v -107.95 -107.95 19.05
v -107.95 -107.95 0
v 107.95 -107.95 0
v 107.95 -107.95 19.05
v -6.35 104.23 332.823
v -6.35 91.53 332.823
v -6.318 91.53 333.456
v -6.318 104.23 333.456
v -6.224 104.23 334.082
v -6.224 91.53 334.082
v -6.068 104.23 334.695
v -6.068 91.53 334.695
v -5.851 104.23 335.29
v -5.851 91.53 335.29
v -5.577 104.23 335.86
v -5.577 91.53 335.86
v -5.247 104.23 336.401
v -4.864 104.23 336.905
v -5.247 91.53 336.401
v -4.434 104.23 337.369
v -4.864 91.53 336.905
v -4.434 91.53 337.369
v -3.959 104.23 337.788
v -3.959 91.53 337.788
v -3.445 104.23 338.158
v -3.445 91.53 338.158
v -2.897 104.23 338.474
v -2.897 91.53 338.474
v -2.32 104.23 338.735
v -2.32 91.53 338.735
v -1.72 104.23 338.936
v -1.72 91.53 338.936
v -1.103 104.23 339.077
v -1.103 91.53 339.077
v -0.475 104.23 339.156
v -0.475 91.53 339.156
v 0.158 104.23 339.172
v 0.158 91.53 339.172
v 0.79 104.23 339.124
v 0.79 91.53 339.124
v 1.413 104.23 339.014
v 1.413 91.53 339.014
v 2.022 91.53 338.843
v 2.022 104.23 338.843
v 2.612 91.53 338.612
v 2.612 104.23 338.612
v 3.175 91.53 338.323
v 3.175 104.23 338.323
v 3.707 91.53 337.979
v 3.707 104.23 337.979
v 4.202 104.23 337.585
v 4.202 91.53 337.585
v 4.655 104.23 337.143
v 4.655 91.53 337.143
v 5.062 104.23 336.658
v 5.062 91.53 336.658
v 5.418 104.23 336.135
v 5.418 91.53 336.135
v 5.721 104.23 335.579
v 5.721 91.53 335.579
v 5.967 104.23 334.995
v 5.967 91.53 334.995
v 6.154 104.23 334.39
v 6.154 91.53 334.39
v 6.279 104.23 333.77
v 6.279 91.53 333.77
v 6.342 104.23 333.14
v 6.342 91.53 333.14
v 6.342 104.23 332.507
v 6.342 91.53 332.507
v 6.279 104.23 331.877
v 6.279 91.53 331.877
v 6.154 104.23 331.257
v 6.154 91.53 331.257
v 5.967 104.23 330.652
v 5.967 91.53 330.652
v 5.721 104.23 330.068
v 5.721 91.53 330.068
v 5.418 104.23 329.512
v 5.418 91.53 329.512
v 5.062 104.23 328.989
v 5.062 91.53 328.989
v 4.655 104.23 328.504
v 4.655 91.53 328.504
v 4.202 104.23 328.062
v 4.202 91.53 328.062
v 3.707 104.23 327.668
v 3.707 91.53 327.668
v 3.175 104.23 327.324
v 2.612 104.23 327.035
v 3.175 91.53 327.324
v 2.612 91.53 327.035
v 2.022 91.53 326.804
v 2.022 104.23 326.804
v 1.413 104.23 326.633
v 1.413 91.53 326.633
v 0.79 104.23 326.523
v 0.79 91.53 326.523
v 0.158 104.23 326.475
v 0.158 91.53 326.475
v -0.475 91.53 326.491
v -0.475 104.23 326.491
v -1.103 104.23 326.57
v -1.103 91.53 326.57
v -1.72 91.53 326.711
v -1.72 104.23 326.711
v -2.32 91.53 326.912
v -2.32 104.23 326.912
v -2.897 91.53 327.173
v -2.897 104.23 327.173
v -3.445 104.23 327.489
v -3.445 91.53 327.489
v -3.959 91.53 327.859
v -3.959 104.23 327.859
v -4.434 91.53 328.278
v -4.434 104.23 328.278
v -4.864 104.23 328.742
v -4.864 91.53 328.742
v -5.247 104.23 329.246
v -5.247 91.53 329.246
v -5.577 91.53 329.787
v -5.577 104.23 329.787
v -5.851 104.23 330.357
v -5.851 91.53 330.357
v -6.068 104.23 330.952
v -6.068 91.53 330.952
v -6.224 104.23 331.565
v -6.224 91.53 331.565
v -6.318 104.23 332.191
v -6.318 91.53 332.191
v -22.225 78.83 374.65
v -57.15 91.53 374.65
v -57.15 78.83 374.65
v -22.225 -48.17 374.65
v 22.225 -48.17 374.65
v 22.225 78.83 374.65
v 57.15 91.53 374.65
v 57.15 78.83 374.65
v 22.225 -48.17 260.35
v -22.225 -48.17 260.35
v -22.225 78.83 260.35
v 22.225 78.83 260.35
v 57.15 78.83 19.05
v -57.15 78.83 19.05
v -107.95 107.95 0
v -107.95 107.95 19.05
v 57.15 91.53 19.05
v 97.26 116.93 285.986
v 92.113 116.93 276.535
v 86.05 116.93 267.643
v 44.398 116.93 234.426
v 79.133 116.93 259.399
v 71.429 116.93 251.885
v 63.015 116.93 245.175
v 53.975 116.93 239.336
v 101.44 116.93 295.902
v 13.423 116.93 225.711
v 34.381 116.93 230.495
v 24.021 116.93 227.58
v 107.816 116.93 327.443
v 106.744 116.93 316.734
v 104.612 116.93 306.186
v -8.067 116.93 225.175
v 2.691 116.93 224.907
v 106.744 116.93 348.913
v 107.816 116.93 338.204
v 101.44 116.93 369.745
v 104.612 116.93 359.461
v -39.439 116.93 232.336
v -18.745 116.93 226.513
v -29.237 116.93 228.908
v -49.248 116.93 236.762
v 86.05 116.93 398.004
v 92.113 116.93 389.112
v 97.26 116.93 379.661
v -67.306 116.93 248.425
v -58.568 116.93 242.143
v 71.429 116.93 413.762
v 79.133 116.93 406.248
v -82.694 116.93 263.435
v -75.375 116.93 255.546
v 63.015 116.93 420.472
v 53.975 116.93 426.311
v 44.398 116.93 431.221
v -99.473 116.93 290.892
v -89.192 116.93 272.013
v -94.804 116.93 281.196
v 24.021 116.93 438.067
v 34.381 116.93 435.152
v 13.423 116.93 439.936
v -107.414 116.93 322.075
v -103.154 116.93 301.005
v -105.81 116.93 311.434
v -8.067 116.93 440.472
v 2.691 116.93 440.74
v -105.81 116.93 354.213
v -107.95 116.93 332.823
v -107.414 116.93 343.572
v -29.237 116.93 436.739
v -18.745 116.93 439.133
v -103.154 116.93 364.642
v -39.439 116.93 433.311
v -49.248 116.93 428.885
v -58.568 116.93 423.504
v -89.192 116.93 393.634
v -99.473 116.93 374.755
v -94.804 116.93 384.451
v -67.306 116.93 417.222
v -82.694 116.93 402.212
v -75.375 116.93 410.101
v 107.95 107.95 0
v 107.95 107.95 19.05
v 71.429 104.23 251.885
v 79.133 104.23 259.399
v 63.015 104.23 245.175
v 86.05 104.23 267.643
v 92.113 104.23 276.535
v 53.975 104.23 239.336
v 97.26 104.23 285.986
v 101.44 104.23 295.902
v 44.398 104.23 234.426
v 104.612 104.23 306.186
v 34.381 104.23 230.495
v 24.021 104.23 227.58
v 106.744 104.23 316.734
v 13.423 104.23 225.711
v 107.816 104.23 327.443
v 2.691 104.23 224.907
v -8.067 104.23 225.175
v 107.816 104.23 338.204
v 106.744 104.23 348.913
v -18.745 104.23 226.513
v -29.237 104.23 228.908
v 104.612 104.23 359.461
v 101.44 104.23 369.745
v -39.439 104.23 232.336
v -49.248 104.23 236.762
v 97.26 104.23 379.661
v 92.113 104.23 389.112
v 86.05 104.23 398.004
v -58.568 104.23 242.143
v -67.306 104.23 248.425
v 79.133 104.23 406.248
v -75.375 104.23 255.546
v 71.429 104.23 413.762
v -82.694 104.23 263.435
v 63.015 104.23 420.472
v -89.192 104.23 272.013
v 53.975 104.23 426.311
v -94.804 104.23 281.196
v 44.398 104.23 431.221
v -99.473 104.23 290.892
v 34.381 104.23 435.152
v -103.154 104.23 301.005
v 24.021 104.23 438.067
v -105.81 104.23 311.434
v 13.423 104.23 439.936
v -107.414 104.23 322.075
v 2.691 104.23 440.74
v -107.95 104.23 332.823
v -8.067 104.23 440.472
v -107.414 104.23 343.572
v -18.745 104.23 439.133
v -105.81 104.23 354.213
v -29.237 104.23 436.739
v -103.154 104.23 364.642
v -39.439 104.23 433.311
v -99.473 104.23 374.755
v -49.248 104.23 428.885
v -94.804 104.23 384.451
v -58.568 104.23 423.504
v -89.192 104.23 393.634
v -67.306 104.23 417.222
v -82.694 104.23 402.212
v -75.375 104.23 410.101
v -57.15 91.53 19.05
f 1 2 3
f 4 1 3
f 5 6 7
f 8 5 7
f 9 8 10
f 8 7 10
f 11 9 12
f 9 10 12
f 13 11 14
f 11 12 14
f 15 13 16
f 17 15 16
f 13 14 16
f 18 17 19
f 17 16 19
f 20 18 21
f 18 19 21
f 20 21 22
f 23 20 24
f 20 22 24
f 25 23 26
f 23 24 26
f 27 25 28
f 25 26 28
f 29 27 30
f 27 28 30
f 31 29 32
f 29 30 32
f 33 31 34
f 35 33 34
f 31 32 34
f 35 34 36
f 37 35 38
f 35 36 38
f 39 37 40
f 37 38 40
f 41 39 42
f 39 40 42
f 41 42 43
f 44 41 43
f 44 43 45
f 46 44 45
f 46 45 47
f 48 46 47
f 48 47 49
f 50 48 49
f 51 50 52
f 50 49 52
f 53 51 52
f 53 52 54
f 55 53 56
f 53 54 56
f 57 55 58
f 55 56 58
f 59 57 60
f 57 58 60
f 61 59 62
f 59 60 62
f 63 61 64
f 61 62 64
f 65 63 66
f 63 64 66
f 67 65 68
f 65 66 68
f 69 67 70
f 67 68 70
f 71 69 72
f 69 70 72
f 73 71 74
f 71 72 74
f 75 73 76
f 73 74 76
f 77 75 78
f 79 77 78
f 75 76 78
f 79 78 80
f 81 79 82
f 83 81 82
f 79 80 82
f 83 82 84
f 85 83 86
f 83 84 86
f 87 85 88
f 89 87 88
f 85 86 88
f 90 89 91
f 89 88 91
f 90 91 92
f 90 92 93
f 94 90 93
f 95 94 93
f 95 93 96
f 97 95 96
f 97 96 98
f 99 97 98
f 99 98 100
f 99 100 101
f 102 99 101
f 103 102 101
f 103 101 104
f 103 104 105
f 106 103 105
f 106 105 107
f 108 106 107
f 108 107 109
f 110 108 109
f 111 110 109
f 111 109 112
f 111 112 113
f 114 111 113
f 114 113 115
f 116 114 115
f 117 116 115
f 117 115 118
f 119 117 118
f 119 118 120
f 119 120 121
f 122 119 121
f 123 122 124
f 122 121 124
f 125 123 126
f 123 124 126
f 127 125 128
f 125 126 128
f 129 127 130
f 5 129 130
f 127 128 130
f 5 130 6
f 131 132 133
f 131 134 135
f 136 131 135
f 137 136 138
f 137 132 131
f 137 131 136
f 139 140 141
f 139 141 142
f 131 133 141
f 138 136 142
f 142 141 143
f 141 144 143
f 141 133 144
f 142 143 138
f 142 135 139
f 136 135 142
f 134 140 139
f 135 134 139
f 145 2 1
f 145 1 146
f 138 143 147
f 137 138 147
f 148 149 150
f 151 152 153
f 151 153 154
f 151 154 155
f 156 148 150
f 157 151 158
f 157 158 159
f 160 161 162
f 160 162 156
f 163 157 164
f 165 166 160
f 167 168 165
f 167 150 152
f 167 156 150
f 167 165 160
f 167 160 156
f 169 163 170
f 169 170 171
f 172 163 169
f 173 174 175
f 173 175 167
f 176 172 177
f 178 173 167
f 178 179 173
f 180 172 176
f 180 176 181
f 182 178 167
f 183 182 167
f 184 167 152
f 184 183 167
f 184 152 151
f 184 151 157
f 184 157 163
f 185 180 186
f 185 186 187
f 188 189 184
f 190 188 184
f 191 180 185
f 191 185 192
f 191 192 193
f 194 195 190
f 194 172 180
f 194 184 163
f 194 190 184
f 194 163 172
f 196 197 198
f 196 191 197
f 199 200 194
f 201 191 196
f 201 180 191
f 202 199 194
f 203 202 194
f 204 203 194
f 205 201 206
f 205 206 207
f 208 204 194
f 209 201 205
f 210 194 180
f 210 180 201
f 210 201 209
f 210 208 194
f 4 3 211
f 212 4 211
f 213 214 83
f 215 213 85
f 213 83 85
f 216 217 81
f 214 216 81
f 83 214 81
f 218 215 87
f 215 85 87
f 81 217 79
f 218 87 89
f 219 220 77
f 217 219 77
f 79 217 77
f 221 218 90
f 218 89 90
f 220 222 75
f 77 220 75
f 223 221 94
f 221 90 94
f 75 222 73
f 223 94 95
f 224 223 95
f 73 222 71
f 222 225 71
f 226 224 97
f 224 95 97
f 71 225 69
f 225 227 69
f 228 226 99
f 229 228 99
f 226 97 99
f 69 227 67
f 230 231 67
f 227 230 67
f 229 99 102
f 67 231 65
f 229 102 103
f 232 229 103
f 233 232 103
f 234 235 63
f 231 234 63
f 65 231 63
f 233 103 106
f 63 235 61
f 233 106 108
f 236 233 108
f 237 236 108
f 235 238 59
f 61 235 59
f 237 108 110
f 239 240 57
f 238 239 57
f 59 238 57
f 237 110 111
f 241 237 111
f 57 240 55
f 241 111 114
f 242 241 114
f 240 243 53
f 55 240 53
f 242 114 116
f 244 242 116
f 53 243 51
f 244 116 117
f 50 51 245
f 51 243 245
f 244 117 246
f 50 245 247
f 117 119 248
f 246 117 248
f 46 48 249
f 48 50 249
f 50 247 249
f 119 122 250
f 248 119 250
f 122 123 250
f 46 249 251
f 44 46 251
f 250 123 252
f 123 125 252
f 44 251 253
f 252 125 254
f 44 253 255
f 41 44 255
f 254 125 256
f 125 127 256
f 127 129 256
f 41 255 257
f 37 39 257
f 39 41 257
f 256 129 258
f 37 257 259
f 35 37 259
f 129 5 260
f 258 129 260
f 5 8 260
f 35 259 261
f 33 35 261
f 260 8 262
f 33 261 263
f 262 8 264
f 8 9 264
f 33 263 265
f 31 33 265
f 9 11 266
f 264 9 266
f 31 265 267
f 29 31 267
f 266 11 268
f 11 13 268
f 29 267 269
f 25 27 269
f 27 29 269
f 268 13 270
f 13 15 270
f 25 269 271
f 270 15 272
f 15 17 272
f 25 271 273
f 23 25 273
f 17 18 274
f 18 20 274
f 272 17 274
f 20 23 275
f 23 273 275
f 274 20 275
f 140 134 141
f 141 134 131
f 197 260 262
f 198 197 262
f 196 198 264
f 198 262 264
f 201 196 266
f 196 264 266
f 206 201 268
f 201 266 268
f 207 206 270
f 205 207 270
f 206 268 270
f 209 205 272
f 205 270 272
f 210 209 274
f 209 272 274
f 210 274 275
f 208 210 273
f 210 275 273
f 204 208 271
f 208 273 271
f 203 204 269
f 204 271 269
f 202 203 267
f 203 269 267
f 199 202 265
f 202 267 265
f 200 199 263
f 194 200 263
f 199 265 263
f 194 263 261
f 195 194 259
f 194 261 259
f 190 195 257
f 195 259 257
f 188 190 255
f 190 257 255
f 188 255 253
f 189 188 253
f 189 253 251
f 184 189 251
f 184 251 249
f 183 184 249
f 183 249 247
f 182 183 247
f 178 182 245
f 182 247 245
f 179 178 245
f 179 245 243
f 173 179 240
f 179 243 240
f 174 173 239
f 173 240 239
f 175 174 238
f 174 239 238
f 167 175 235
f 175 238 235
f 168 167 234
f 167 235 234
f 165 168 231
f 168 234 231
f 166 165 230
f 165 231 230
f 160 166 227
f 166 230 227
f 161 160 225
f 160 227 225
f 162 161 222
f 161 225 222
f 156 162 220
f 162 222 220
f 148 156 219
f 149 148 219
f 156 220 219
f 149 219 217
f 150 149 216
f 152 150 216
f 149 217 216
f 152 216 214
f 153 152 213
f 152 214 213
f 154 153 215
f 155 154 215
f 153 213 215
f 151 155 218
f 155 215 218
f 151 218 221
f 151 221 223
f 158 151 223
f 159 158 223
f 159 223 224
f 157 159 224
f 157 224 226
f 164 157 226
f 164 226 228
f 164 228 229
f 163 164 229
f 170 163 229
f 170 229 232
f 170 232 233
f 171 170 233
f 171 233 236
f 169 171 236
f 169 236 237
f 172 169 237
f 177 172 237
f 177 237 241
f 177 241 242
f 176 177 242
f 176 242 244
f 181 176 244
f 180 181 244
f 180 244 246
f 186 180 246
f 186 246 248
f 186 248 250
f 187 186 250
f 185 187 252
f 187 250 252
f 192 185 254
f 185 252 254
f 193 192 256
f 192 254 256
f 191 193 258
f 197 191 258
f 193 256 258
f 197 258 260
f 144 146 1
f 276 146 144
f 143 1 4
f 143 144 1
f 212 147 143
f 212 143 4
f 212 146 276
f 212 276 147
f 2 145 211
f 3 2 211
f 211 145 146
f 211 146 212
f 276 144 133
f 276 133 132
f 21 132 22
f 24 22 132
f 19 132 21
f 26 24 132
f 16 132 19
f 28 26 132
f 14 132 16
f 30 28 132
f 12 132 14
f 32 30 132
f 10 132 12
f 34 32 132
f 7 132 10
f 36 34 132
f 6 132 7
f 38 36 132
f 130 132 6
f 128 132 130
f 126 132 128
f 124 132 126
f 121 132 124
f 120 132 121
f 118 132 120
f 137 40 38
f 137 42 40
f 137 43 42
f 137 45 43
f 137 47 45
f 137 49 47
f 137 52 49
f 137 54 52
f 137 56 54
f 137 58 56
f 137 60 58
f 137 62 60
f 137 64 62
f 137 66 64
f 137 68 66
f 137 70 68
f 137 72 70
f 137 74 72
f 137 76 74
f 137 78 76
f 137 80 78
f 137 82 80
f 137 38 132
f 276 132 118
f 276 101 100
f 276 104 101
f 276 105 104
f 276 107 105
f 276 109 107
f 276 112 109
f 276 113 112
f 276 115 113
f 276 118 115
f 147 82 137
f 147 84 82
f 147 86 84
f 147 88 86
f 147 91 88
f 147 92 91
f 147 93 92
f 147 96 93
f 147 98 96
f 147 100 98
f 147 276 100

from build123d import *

# Parameters (mm, degrees)
F0_W      = 215.9
F0_H      = 215.9
F1_DEPTH  = 19.05
F3_W      = 114.3
F3_H      = 12.7
F4_DEPTH  = 355.6
F5_W      = 44.45
F5_H      = 127
F6_DEPTH  = 114.3
F9_R      = 6.35
F10_DEPTH = 12.7
F11_R     = 107.95
F12_DEPTH = 12.7


# Not quite as in the source:
# - a feature of the source that left no trace in its solid (it failed there, or was rolled back) is left out


with BuildPart() as f1:
    # F0 (on Top) → F1 (new body)
    with BuildSketch(Plane.XY):
        Rectangle(F0_W, F0_H)
    extrude(amount=F1_DEPTH)

    # F3 (on face) → F4 (join)
    with BuildSketch(Plane.XY.offset(19.05)):
        with Locations((0, 85.1799877524)):
            Rectangle(F3_W, F3_H)
    extrude(amount=F4_DEPTH)

    # F5 (on face) → F6 (join)
    with BuildSketch(Plane.XY.offset(374.65)):
        with Locations((0, 15.3299877524)):
            Rectangle(F5_W, F5_H)
    extrude(amount=-F6_DEPTH)

    # F9 (on face) → F10 (join)
    with BuildSketch(Plane(origin=(0, 91.5299877524, 0), x_dir=(-1, 0, 0), z_dir=(0, 1, 0))):
        with Locations((0, 332.823485136)):
            Circle(F9_R)
    extrude(amount=F10_DEPTH)

    # F11 (on face) → F12 (join)
    with BuildSketch(Plane(origin=(0, 104.2299877524, 0), x_dir=(-1, 0, 0), z_dir=(0, 1, 0))):
        with Locations((0, 332.823485136)):
            Circle(F11_R)
    extrude(amount=F12_DEPTH)


solid = f1.part
